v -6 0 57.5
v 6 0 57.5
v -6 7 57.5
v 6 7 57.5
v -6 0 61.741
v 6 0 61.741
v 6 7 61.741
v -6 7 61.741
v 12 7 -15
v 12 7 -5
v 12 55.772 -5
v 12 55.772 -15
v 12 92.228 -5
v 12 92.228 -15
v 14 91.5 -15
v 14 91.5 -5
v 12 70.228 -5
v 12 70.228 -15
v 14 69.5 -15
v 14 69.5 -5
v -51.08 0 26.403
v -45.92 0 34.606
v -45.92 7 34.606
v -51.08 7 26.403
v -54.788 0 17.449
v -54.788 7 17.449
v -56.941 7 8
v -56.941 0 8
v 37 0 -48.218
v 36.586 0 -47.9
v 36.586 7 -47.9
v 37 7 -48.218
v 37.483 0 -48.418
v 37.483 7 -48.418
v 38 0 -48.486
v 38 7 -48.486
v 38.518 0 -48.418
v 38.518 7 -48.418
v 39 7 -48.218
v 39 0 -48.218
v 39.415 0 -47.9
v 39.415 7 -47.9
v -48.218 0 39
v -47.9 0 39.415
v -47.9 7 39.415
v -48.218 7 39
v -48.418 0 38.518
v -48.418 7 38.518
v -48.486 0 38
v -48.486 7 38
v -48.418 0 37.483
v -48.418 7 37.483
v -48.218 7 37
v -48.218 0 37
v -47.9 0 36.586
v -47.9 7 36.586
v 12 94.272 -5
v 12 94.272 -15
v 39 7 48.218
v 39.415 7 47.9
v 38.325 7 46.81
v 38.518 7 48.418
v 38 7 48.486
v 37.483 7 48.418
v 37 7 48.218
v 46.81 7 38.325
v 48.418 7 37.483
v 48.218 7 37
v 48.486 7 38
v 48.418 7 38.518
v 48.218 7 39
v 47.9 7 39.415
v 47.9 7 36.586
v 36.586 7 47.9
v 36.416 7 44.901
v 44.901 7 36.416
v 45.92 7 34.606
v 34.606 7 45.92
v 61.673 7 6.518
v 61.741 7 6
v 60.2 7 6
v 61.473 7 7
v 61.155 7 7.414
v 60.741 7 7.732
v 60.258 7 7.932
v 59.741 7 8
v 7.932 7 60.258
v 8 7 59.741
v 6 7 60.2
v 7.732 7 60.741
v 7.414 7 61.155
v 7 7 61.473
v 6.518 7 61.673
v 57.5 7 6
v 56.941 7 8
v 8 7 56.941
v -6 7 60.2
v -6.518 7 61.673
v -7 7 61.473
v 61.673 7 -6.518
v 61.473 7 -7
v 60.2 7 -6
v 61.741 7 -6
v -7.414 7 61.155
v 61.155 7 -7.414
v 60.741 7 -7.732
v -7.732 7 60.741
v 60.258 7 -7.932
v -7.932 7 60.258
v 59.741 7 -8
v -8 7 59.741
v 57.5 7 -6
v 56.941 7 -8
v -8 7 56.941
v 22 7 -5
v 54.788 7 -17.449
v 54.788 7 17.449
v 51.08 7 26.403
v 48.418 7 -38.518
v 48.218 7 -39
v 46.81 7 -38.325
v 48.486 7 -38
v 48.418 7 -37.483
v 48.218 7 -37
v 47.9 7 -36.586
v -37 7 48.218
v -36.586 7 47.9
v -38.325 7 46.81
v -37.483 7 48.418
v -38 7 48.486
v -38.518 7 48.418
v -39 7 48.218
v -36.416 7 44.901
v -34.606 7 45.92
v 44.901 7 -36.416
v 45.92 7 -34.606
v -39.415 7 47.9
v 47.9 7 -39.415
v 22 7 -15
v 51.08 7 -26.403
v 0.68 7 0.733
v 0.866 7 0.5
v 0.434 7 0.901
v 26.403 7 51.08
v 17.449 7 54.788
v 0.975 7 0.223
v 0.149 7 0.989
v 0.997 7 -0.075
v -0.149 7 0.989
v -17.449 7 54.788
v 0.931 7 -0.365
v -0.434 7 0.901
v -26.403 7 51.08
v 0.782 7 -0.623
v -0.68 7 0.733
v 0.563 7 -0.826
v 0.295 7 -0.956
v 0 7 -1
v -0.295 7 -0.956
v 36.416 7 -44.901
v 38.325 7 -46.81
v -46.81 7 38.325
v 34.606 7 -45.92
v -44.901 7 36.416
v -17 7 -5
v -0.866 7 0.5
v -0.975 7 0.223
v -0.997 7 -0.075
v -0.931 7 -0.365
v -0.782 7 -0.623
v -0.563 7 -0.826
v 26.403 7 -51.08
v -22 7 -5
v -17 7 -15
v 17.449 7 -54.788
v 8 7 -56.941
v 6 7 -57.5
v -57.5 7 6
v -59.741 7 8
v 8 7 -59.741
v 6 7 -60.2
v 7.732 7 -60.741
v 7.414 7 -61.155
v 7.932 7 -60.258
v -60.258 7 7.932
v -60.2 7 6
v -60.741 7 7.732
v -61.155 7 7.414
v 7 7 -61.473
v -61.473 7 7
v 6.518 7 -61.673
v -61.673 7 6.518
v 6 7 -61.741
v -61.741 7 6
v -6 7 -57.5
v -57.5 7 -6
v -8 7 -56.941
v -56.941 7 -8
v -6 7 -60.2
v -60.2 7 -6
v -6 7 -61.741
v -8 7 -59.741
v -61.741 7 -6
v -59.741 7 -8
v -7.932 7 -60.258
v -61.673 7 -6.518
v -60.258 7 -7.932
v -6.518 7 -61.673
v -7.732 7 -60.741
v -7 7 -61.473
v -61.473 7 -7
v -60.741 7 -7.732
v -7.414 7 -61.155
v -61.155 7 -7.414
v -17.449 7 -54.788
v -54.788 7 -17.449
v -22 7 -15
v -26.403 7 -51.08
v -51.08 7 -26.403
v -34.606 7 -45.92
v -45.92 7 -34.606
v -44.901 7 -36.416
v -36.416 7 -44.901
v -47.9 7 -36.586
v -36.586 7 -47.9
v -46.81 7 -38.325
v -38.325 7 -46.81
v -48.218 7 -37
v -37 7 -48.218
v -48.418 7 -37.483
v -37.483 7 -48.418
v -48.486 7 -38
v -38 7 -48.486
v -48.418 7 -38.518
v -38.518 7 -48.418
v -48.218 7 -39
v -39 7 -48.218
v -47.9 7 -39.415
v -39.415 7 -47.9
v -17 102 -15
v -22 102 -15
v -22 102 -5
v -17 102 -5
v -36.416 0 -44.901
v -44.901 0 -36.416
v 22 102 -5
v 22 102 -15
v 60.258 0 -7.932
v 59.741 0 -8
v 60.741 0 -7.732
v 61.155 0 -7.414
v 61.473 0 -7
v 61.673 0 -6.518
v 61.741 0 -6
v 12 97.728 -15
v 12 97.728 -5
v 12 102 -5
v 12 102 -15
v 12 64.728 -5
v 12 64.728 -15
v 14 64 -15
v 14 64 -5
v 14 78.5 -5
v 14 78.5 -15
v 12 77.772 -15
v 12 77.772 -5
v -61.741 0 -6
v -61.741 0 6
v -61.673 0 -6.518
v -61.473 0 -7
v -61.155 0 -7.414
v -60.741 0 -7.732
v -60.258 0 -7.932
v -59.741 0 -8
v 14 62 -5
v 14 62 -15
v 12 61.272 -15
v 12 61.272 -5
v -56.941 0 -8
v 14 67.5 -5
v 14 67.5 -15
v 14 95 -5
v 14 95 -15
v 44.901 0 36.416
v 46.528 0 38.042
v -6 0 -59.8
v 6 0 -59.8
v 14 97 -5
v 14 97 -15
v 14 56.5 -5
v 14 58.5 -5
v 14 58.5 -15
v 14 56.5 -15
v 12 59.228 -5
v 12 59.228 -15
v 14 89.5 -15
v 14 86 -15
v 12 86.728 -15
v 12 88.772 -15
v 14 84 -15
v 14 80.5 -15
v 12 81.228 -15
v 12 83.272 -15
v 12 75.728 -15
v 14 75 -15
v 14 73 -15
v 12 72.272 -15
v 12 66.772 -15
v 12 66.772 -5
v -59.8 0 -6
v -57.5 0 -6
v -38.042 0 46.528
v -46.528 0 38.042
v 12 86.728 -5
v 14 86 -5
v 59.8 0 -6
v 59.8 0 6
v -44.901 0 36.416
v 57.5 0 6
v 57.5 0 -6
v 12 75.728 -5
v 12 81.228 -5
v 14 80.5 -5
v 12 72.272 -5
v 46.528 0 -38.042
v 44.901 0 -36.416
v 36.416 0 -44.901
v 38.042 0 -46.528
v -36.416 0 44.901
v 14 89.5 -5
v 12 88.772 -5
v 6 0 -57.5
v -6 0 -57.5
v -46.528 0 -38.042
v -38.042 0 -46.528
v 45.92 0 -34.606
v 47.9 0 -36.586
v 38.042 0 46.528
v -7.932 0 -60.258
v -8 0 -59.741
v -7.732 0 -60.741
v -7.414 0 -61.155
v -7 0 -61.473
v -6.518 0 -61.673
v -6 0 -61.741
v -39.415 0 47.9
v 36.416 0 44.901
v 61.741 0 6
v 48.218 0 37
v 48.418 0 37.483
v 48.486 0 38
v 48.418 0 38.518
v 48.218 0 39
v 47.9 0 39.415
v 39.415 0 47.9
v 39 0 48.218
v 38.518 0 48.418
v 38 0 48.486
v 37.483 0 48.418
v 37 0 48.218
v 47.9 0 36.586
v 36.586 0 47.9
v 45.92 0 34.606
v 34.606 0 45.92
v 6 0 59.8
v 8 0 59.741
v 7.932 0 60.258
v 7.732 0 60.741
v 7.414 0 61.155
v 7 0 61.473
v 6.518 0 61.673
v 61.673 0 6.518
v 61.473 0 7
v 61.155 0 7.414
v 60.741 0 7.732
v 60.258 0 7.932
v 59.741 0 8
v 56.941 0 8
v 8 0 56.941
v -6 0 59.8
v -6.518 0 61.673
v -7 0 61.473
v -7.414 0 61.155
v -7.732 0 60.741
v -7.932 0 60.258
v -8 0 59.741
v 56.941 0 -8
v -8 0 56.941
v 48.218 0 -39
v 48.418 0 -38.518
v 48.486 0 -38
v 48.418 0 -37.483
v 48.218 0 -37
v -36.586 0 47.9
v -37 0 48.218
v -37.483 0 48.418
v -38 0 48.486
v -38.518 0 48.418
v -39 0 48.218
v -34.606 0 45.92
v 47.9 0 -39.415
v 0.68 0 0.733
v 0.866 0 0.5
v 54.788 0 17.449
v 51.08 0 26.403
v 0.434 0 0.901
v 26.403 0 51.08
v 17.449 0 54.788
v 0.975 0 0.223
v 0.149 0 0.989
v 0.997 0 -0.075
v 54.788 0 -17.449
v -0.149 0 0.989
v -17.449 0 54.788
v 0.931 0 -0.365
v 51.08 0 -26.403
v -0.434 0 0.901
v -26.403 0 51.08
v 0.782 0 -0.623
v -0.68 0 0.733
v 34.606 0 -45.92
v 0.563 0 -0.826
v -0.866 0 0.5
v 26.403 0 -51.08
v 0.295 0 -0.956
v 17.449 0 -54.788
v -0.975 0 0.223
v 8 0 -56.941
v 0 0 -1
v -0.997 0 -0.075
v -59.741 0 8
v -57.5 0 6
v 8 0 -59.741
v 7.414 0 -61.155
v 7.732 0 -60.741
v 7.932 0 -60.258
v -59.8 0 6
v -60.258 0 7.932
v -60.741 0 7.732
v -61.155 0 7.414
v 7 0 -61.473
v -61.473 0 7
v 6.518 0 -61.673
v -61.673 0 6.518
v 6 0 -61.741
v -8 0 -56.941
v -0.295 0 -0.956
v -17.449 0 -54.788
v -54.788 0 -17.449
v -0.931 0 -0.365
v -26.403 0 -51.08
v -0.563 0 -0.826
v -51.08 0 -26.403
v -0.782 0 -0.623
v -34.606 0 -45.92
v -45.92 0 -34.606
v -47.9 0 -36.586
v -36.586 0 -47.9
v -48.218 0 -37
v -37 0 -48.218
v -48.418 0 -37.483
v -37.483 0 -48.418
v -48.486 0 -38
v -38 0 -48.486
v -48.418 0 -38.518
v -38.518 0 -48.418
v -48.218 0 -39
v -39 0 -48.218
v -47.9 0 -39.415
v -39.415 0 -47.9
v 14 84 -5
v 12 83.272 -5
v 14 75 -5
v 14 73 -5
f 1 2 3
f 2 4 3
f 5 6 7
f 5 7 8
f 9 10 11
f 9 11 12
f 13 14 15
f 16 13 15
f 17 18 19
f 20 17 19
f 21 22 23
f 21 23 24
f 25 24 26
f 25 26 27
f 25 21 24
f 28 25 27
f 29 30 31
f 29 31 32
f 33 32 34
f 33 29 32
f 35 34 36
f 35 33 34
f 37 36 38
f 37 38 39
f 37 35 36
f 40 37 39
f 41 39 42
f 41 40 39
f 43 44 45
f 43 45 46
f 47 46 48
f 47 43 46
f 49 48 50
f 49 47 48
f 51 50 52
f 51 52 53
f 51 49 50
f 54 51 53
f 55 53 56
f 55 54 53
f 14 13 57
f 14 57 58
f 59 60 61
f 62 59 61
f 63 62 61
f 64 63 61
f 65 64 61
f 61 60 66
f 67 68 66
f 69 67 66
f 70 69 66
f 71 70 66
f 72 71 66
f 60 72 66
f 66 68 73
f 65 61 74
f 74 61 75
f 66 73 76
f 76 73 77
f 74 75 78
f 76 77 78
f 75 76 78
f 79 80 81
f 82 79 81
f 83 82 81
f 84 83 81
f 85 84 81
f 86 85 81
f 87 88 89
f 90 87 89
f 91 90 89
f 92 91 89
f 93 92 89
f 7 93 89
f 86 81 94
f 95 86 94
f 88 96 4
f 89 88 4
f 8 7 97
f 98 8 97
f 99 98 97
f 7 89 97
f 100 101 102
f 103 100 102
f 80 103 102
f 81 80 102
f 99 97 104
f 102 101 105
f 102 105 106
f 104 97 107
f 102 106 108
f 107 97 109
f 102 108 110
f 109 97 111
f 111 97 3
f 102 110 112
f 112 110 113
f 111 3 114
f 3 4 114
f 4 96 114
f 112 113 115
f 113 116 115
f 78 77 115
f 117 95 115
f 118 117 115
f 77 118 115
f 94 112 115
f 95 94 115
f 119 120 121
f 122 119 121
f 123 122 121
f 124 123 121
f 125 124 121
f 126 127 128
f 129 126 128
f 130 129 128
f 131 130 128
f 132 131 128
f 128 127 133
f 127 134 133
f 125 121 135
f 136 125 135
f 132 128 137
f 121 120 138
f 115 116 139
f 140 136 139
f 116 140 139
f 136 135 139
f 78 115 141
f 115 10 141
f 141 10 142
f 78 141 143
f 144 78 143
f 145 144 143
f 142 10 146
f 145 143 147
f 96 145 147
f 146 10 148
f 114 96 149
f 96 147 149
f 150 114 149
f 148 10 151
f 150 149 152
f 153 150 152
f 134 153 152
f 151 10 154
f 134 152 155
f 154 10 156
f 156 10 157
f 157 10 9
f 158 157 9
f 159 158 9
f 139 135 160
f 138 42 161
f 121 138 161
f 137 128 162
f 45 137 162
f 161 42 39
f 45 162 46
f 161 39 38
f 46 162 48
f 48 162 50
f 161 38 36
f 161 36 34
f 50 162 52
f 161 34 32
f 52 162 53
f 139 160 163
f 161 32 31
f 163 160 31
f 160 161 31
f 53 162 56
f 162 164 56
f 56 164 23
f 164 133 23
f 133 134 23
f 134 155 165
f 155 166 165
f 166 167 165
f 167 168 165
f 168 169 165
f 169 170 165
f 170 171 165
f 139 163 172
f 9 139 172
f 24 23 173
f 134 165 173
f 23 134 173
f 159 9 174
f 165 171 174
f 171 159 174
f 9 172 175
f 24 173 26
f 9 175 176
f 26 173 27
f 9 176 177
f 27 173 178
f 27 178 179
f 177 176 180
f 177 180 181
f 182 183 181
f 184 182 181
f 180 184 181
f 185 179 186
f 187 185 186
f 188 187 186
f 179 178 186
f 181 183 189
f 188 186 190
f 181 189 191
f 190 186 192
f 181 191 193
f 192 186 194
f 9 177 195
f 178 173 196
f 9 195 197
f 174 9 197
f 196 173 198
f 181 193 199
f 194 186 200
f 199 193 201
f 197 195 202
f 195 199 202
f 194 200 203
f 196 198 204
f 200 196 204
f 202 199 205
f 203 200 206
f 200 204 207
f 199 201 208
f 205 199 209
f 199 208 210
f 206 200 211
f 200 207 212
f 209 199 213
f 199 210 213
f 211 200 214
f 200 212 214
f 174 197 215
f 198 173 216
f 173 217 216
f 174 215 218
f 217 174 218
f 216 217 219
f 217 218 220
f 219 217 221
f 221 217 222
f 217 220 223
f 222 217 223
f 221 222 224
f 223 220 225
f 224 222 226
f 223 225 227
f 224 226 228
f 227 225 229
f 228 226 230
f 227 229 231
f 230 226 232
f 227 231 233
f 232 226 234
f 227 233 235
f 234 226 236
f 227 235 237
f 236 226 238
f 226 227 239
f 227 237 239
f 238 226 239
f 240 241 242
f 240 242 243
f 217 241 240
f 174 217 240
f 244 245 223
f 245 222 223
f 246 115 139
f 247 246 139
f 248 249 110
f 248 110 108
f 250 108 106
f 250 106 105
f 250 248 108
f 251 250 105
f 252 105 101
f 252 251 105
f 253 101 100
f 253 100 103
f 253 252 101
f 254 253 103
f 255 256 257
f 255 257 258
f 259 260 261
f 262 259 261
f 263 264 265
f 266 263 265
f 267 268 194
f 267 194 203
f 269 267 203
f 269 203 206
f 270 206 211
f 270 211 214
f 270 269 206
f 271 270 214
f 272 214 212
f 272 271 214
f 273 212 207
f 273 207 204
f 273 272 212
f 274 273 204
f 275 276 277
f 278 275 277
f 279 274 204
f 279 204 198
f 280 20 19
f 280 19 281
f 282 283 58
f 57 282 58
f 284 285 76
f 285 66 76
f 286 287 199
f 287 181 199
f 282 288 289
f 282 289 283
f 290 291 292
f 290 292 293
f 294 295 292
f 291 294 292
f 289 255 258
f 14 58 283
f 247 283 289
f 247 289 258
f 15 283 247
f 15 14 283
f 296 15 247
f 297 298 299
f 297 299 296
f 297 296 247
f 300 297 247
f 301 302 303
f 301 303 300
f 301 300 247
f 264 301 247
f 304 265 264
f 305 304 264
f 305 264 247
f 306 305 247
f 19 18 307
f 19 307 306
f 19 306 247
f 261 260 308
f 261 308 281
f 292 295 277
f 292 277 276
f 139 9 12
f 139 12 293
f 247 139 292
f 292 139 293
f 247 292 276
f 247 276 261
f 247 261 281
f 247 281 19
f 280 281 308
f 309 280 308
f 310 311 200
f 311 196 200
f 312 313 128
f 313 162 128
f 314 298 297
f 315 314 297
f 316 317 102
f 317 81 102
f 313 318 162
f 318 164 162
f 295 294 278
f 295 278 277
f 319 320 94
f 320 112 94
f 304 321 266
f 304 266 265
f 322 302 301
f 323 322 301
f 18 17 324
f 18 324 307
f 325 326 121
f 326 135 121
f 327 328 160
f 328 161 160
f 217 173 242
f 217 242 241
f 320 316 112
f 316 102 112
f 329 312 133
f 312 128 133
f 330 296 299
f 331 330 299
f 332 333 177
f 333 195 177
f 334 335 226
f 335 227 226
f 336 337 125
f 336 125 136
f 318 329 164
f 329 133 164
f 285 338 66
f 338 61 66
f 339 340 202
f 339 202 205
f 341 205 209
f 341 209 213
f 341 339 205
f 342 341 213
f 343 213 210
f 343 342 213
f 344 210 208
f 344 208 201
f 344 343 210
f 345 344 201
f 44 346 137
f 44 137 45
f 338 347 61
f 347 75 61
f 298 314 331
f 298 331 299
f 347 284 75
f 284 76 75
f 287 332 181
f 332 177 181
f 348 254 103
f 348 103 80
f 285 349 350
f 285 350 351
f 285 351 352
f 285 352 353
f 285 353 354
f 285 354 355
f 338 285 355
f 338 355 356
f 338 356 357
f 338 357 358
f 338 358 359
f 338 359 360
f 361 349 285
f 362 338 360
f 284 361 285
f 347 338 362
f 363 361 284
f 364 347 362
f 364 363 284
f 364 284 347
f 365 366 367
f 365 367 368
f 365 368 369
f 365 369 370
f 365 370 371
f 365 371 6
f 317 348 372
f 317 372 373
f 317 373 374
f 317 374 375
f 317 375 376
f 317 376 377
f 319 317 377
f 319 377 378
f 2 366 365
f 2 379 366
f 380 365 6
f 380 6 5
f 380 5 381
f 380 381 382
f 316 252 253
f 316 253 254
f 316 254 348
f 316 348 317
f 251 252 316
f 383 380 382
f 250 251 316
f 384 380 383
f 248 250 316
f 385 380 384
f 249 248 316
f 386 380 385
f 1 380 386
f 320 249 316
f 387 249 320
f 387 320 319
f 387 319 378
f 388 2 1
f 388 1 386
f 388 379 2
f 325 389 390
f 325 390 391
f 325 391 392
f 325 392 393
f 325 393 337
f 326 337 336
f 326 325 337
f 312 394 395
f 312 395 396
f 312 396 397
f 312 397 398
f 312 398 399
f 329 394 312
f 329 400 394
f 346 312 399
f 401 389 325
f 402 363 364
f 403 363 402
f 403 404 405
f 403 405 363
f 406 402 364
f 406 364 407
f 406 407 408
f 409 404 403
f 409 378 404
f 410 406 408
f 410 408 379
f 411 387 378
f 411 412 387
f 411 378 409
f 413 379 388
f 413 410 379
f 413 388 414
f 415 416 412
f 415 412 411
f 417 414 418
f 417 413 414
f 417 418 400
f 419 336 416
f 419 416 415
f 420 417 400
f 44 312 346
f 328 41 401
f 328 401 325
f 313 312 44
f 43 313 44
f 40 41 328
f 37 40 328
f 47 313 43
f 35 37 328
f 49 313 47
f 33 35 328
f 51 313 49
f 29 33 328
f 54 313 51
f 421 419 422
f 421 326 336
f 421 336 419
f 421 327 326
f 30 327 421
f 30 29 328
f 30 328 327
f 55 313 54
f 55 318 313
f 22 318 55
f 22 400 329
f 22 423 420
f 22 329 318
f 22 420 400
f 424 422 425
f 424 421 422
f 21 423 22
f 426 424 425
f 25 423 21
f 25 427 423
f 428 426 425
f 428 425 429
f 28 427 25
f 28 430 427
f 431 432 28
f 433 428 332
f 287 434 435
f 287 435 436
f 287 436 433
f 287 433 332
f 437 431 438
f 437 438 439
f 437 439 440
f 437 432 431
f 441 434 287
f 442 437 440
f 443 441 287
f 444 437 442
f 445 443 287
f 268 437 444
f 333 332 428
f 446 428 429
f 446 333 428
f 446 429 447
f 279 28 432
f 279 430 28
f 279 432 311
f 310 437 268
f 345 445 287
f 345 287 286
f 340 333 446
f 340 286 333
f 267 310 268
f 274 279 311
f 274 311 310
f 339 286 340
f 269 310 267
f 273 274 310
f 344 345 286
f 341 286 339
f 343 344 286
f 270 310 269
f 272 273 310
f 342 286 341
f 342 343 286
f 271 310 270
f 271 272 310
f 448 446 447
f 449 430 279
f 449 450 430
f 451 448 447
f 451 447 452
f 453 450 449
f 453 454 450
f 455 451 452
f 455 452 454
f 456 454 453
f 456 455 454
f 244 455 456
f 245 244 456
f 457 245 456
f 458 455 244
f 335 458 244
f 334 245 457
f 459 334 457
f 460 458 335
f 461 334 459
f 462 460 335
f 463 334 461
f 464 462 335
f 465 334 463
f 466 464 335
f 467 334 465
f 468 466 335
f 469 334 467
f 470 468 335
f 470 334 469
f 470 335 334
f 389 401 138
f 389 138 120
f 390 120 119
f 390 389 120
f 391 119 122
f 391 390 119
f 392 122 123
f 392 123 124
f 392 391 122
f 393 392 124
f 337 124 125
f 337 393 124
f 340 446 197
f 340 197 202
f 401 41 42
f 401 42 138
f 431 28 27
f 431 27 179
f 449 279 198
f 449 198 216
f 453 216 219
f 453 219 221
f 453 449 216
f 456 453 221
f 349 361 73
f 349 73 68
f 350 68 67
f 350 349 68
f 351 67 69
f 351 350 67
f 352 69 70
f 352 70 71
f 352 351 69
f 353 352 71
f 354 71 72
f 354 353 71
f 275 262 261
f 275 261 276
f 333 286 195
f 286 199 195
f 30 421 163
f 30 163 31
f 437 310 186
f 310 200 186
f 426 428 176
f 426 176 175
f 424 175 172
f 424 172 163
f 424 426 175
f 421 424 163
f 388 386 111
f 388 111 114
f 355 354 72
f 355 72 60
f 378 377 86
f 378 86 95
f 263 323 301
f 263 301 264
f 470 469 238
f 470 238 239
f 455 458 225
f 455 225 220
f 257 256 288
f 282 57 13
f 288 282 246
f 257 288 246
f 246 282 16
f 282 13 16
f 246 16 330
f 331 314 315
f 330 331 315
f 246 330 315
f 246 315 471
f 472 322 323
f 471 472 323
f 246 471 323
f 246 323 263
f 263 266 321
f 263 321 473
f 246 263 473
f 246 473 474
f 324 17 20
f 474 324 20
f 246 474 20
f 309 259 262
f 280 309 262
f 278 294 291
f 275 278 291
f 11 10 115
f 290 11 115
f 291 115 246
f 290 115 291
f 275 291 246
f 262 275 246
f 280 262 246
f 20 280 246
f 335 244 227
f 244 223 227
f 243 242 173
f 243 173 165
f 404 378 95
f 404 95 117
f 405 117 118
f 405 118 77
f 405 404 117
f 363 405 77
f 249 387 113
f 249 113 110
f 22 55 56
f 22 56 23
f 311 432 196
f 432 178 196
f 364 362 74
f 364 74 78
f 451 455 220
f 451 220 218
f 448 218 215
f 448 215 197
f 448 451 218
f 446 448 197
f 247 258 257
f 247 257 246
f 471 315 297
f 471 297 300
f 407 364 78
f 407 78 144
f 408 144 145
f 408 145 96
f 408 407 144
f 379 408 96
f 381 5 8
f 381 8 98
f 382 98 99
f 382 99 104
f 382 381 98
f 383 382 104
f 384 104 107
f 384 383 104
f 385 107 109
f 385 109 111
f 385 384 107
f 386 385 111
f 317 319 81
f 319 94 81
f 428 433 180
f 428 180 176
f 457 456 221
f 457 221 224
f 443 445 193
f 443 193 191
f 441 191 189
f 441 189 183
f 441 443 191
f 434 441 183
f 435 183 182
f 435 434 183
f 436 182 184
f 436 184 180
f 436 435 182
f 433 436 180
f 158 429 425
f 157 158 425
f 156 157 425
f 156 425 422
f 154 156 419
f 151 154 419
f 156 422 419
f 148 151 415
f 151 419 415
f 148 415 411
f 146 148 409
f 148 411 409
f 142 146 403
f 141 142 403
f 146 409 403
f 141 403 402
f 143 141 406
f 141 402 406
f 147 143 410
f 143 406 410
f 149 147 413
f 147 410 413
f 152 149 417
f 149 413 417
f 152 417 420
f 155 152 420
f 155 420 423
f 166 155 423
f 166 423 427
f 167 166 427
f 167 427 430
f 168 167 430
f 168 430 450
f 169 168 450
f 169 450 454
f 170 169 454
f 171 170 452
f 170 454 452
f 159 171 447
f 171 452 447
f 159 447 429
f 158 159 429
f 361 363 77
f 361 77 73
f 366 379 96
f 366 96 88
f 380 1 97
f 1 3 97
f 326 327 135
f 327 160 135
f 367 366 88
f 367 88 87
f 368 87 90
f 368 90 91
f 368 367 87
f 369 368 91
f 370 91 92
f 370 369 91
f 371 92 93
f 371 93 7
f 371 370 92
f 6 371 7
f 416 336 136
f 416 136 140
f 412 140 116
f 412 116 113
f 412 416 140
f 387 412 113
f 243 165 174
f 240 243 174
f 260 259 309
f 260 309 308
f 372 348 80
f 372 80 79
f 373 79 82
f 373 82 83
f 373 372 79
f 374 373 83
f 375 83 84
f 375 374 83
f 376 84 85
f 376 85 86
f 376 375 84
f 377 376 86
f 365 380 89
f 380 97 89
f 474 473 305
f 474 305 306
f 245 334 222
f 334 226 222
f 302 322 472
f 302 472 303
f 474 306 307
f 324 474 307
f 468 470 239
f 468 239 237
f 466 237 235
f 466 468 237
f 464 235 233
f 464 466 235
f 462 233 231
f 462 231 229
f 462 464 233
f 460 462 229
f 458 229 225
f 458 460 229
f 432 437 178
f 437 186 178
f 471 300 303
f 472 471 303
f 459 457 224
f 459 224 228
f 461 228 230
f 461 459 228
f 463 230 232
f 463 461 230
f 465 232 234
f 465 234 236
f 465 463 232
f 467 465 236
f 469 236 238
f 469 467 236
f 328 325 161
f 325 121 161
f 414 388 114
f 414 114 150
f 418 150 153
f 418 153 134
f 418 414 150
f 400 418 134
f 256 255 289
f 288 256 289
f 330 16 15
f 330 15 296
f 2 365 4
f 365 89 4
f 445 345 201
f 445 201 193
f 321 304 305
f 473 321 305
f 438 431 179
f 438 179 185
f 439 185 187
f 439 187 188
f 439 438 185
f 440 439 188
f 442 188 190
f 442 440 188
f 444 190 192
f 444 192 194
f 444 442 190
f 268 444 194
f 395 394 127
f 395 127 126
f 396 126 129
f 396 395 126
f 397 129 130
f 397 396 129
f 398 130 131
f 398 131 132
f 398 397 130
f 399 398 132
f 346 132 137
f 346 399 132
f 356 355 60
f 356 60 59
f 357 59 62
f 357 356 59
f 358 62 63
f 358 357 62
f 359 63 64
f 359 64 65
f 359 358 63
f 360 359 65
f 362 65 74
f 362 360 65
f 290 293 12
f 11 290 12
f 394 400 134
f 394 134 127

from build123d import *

# Parameters (mm, degrees)
BOSS_EXTRUDE1_DEPTH = 7
SKETCH2_W           = 10
SKETCH2_H           = 10
SKETCH2_W_2         = 5
BOSS_EXTRUDE2_DEPTH = 95
SKETCH15_R          = 1
CUT_EXTRUDE3_DEPTH  = 7
CIRPATTERN1_COUNT   = 8
CUT_EXTRUDE4_DEPTH  = 10
LPATTERN1_COUNT     = 8
LPATTERN1_PITCH     = 5.5


with BuildPart() as part:
    # Sketch1 → Boss-Extrude1 (new body)
    with BuildSketch(Plane(origin=(0, 0, 0), x_dir=(1, 0, 0), z_dir=(0, 1, 0))):
        with BuildLine():
            Line((-8, 56.940758688), (-8, 59.740758688))
            ThreePointArc((-8, 59.740758688), (-7.414213562, 61.154972251), (-6, 61.740758688))
            Line((-6, 61.740758688), (6, 61.740758688))
            ThreePointArc((6, 61.740758688), (7.414213562, 61.154972251), (8, 59.740758688))
            Line((8, 59.740758688), (8, 56.940758688))
            ThreePointArc((8, 56.940758688), (22.004297361, 53.123073119), (34.606342345, 45.920050844))
            Line((34.606342345, 45.920050844), (36.586241332, 47.899949831))
            ThreePointArc((36.586241332, 47.899949831), (38.000454895, 48.485736269), (39.414668457, 47.899949831))
            Line((39.414668457, 47.899949831), (47.899949831, 39.414668457))
            ThreePointArc((47.899949831, 39.414668457), (48.485736269, 38.000454895), (47.899949831, 36.586241332))
            Line((47.899949831, 36.586241332), (45.920050844, 34.606342345))
            ThreePointArc((45.920050844, 34.606342345), (53.123073119, 22.004297361), (56.940758688, 8))
            Line((56.940758688, 8), (59.740758688, 8))
            ThreePointArc((59.740758688, 8), (61.154972251, 7.414213562), (61.740758688, 6))
            Line((61.740758688, 6), (61.740758688, -6))
            ThreePointArc((61.740758688, -6), (61.154972251, -7.414213562), (59.740758688, -8))
            Line((59.740758688, -8), (56.940758688, -8))
            ThreePointArc((56.940758688, -8), (53.123073119, -22.004297361), (45.920050844, -34.606342345))
            Line((45.920050844, -34.606342345), (47.899949831, -36.586241332))
            ThreePointArc((47.899949831, -36.586241332), (48.485736269, -38.000454895), (47.899949831, -39.414668457))
            Line((47.899949831, -39.414668457), (39.414668457, -47.899949831))
            ThreePointArc((39.414668457, -47.899949831), (38.000454895, -48.485736269), (36.586241332, -47.899949831))
            Line((36.586241332, -47.899949831), (34.606342345, -45.920050844))
            ThreePointArc((34.606342345, -45.920050844), (22.004297361, -53.123073119), (8, -56.940758688))
            Line((8, -56.940758688), (8, -59.740758688))
            ThreePointArc((8, -59.740758688), (7.414213562, -61.154972251), (6, -61.740758688))
            Line((6, -61.740758688), (-6, -61.740758688))
            ThreePointArc((-6, -61.740758688), (-7.414213562, -61.154972251), (-8, -59.740758688))
            Line((-8, -59.740758688), (-8, -56.940758688))
            ThreePointArc((-8, -56.940758688), (-22.004297361, -53.123073119), (-34.606342345, -45.920050844))
            Line((-34.606342345, -45.920050844), (-36.586241332, -47.899949831))
            ThreePointArc((-36.586241332, -47.899949831), (-38.000454895, -48.485736269), (-39.414668457, -47.899949831))
            Line((-39.414668457, -47.899949831), (-47.899949831, -39.414668457))
            ThreePointArc((-47.899949831, -39.414668457), (-48.485736269, -38.000454895), (-47.899949831, -36.586241332))
            Line((-47.899949831, -36.586241332), (-45.920050844, -34.606342345))
            ThreePointArc((-45.920050844, -34.606342345), (-53.123073119, -22.004297361), (-56.940758688, -8))
            Line((-56.940758688, -8), (-59.740758688, -8))
            ThreePointArc((-59.740758688, -8), (-61.154972251, -7.414213562), (-61.740758688, -6))
            Line((-61.740758688, -6), (-61.740758688, 6))
            ThreePointArc((-61.740758688, 6), (-61.154972251, 7.414213562), (-59.740758688, 8))
            Line((-59.740758688, 8), (-56.940758688, 8))
            ThreePointArc((-56.940758688, 8), (-53.123073119, 22.004297361), (-45.920050844, 34.606342345))
            Line((-45.920050844, 34.606342345), (-47.899949831, 36.586241332))
            ThreePointArc((-47.899949831, 36.586241332), (-48.485736269, 38.000454895), (-47.899949831, 39.414668457))
            Line((-47.899949831, 39.414668457), (-39.414668457, 47.899949831))
            ThreePointArc((-39.414668457, 47.899949831), (-38.000454895, 48.485736269), (-36.586241332, 47.899949831))
            Line((-36.586241332, 47.899949831), (-34.606342345, 45.920050844))
            ThreePointArc((-34.606342345, 45.920050844), (-22.004297361, 53.123073119), (-8, 56.940758688))
        make_face()
    extrude(amount=BOSS_EXTRUDE1_DEPTH)

    # Sketch2 → Boss-Extrude2 (add)
    with BuildSketch(Plane(origin=(0, 7, 0), x_dir=(1, 0, 0), z_dir=(0, 1, 0))):
        with Locations((17, 10)):
            Rectangle(SKETCH2_W, SKETCH2_H)
        with Locations((-19.5, 10)):
            Rectangle(SKETCH2_W_2, SKETCH2_H)
    extrude(amount=BOSS_EXTRUDE2_DEPTH)

    # Sketch15 → Cut-Extrude3 (cut)
    with BuildSketch(Plane.XZ):
        with Locations(Location((0, 0, 0), (0, 0, 270))):
            Circle(SKETCH15_R)
    extrude(amount=-CUT_EXTRUDE3_DEPTH, mode=Mode.SUBTRACT)

    # Sketch16 → Cut-Loft2 section 0
    with BuildSketch(Plane.XZ):
        with BuildLine():
            Line((-6, 59.8), (6, 59.8))
            Line((6, 59.8), (6, 57.5))
            Line((6, 57.5), (-6, 57.5))
            Line((-6, 57.5), (-6, 59.8))
        make_face()
    # Sketch17 → Cut-Loft2 section 1
    with BuildSketch(Plane(origin=(0, 7, 0), x_dir=(1, 0, 0), z_dir=(0, 1, 0))):
        with BuildLine():
            Line((-6, -57.5), (6, -57.5))
            Line((6, -57.5), (6, -60.2))
            Line((6, -60.2), (-6, -60.2))
            Line((-6, -60.2), (-6, -57.5))
        make_face()
    cut_loft2 = loft(mode=Mode.SUBTRACT)

    # CirPattern1: Cut-Loft2 ×8 about axis
    cirpattern1_axis = Axis((0, 0, 0), (0, 1, 0))
    for i in range(1, CIRPATTERN1_COUNT):
        add(cut_loft2.rotate(cirpattern1_axis, i * 360 / CIRPATTERN1_COUNT), mode=Mode.SUBTRACT)

    # Sketch18 → Cut-Extrude4 (cut)
    with BuildSketch(Plane(origin=(0, 0, -15), x_dir=(-1, 0, 0), z_dir=(0, 0, -1))):
        Polygon((-12, 97.727940469), (-14, 97), (-14, 95), (-12, 94.272059531), align=None)
    cut_extrude4 = extrude(amount=-CUT_EXTRUDE4_DEPTH, mode=Mode.SUBTRACT)

    # LPattern1: Cut-Extrude4 ×8
    with Locations(*[(0, -i * LPATTERN1_PITCH, 0) for i in range(1, LPATTERN1_COUNT)]):
        add(cut_extrude4, mode=Mode.SUBTRACT)


solid = part.part
